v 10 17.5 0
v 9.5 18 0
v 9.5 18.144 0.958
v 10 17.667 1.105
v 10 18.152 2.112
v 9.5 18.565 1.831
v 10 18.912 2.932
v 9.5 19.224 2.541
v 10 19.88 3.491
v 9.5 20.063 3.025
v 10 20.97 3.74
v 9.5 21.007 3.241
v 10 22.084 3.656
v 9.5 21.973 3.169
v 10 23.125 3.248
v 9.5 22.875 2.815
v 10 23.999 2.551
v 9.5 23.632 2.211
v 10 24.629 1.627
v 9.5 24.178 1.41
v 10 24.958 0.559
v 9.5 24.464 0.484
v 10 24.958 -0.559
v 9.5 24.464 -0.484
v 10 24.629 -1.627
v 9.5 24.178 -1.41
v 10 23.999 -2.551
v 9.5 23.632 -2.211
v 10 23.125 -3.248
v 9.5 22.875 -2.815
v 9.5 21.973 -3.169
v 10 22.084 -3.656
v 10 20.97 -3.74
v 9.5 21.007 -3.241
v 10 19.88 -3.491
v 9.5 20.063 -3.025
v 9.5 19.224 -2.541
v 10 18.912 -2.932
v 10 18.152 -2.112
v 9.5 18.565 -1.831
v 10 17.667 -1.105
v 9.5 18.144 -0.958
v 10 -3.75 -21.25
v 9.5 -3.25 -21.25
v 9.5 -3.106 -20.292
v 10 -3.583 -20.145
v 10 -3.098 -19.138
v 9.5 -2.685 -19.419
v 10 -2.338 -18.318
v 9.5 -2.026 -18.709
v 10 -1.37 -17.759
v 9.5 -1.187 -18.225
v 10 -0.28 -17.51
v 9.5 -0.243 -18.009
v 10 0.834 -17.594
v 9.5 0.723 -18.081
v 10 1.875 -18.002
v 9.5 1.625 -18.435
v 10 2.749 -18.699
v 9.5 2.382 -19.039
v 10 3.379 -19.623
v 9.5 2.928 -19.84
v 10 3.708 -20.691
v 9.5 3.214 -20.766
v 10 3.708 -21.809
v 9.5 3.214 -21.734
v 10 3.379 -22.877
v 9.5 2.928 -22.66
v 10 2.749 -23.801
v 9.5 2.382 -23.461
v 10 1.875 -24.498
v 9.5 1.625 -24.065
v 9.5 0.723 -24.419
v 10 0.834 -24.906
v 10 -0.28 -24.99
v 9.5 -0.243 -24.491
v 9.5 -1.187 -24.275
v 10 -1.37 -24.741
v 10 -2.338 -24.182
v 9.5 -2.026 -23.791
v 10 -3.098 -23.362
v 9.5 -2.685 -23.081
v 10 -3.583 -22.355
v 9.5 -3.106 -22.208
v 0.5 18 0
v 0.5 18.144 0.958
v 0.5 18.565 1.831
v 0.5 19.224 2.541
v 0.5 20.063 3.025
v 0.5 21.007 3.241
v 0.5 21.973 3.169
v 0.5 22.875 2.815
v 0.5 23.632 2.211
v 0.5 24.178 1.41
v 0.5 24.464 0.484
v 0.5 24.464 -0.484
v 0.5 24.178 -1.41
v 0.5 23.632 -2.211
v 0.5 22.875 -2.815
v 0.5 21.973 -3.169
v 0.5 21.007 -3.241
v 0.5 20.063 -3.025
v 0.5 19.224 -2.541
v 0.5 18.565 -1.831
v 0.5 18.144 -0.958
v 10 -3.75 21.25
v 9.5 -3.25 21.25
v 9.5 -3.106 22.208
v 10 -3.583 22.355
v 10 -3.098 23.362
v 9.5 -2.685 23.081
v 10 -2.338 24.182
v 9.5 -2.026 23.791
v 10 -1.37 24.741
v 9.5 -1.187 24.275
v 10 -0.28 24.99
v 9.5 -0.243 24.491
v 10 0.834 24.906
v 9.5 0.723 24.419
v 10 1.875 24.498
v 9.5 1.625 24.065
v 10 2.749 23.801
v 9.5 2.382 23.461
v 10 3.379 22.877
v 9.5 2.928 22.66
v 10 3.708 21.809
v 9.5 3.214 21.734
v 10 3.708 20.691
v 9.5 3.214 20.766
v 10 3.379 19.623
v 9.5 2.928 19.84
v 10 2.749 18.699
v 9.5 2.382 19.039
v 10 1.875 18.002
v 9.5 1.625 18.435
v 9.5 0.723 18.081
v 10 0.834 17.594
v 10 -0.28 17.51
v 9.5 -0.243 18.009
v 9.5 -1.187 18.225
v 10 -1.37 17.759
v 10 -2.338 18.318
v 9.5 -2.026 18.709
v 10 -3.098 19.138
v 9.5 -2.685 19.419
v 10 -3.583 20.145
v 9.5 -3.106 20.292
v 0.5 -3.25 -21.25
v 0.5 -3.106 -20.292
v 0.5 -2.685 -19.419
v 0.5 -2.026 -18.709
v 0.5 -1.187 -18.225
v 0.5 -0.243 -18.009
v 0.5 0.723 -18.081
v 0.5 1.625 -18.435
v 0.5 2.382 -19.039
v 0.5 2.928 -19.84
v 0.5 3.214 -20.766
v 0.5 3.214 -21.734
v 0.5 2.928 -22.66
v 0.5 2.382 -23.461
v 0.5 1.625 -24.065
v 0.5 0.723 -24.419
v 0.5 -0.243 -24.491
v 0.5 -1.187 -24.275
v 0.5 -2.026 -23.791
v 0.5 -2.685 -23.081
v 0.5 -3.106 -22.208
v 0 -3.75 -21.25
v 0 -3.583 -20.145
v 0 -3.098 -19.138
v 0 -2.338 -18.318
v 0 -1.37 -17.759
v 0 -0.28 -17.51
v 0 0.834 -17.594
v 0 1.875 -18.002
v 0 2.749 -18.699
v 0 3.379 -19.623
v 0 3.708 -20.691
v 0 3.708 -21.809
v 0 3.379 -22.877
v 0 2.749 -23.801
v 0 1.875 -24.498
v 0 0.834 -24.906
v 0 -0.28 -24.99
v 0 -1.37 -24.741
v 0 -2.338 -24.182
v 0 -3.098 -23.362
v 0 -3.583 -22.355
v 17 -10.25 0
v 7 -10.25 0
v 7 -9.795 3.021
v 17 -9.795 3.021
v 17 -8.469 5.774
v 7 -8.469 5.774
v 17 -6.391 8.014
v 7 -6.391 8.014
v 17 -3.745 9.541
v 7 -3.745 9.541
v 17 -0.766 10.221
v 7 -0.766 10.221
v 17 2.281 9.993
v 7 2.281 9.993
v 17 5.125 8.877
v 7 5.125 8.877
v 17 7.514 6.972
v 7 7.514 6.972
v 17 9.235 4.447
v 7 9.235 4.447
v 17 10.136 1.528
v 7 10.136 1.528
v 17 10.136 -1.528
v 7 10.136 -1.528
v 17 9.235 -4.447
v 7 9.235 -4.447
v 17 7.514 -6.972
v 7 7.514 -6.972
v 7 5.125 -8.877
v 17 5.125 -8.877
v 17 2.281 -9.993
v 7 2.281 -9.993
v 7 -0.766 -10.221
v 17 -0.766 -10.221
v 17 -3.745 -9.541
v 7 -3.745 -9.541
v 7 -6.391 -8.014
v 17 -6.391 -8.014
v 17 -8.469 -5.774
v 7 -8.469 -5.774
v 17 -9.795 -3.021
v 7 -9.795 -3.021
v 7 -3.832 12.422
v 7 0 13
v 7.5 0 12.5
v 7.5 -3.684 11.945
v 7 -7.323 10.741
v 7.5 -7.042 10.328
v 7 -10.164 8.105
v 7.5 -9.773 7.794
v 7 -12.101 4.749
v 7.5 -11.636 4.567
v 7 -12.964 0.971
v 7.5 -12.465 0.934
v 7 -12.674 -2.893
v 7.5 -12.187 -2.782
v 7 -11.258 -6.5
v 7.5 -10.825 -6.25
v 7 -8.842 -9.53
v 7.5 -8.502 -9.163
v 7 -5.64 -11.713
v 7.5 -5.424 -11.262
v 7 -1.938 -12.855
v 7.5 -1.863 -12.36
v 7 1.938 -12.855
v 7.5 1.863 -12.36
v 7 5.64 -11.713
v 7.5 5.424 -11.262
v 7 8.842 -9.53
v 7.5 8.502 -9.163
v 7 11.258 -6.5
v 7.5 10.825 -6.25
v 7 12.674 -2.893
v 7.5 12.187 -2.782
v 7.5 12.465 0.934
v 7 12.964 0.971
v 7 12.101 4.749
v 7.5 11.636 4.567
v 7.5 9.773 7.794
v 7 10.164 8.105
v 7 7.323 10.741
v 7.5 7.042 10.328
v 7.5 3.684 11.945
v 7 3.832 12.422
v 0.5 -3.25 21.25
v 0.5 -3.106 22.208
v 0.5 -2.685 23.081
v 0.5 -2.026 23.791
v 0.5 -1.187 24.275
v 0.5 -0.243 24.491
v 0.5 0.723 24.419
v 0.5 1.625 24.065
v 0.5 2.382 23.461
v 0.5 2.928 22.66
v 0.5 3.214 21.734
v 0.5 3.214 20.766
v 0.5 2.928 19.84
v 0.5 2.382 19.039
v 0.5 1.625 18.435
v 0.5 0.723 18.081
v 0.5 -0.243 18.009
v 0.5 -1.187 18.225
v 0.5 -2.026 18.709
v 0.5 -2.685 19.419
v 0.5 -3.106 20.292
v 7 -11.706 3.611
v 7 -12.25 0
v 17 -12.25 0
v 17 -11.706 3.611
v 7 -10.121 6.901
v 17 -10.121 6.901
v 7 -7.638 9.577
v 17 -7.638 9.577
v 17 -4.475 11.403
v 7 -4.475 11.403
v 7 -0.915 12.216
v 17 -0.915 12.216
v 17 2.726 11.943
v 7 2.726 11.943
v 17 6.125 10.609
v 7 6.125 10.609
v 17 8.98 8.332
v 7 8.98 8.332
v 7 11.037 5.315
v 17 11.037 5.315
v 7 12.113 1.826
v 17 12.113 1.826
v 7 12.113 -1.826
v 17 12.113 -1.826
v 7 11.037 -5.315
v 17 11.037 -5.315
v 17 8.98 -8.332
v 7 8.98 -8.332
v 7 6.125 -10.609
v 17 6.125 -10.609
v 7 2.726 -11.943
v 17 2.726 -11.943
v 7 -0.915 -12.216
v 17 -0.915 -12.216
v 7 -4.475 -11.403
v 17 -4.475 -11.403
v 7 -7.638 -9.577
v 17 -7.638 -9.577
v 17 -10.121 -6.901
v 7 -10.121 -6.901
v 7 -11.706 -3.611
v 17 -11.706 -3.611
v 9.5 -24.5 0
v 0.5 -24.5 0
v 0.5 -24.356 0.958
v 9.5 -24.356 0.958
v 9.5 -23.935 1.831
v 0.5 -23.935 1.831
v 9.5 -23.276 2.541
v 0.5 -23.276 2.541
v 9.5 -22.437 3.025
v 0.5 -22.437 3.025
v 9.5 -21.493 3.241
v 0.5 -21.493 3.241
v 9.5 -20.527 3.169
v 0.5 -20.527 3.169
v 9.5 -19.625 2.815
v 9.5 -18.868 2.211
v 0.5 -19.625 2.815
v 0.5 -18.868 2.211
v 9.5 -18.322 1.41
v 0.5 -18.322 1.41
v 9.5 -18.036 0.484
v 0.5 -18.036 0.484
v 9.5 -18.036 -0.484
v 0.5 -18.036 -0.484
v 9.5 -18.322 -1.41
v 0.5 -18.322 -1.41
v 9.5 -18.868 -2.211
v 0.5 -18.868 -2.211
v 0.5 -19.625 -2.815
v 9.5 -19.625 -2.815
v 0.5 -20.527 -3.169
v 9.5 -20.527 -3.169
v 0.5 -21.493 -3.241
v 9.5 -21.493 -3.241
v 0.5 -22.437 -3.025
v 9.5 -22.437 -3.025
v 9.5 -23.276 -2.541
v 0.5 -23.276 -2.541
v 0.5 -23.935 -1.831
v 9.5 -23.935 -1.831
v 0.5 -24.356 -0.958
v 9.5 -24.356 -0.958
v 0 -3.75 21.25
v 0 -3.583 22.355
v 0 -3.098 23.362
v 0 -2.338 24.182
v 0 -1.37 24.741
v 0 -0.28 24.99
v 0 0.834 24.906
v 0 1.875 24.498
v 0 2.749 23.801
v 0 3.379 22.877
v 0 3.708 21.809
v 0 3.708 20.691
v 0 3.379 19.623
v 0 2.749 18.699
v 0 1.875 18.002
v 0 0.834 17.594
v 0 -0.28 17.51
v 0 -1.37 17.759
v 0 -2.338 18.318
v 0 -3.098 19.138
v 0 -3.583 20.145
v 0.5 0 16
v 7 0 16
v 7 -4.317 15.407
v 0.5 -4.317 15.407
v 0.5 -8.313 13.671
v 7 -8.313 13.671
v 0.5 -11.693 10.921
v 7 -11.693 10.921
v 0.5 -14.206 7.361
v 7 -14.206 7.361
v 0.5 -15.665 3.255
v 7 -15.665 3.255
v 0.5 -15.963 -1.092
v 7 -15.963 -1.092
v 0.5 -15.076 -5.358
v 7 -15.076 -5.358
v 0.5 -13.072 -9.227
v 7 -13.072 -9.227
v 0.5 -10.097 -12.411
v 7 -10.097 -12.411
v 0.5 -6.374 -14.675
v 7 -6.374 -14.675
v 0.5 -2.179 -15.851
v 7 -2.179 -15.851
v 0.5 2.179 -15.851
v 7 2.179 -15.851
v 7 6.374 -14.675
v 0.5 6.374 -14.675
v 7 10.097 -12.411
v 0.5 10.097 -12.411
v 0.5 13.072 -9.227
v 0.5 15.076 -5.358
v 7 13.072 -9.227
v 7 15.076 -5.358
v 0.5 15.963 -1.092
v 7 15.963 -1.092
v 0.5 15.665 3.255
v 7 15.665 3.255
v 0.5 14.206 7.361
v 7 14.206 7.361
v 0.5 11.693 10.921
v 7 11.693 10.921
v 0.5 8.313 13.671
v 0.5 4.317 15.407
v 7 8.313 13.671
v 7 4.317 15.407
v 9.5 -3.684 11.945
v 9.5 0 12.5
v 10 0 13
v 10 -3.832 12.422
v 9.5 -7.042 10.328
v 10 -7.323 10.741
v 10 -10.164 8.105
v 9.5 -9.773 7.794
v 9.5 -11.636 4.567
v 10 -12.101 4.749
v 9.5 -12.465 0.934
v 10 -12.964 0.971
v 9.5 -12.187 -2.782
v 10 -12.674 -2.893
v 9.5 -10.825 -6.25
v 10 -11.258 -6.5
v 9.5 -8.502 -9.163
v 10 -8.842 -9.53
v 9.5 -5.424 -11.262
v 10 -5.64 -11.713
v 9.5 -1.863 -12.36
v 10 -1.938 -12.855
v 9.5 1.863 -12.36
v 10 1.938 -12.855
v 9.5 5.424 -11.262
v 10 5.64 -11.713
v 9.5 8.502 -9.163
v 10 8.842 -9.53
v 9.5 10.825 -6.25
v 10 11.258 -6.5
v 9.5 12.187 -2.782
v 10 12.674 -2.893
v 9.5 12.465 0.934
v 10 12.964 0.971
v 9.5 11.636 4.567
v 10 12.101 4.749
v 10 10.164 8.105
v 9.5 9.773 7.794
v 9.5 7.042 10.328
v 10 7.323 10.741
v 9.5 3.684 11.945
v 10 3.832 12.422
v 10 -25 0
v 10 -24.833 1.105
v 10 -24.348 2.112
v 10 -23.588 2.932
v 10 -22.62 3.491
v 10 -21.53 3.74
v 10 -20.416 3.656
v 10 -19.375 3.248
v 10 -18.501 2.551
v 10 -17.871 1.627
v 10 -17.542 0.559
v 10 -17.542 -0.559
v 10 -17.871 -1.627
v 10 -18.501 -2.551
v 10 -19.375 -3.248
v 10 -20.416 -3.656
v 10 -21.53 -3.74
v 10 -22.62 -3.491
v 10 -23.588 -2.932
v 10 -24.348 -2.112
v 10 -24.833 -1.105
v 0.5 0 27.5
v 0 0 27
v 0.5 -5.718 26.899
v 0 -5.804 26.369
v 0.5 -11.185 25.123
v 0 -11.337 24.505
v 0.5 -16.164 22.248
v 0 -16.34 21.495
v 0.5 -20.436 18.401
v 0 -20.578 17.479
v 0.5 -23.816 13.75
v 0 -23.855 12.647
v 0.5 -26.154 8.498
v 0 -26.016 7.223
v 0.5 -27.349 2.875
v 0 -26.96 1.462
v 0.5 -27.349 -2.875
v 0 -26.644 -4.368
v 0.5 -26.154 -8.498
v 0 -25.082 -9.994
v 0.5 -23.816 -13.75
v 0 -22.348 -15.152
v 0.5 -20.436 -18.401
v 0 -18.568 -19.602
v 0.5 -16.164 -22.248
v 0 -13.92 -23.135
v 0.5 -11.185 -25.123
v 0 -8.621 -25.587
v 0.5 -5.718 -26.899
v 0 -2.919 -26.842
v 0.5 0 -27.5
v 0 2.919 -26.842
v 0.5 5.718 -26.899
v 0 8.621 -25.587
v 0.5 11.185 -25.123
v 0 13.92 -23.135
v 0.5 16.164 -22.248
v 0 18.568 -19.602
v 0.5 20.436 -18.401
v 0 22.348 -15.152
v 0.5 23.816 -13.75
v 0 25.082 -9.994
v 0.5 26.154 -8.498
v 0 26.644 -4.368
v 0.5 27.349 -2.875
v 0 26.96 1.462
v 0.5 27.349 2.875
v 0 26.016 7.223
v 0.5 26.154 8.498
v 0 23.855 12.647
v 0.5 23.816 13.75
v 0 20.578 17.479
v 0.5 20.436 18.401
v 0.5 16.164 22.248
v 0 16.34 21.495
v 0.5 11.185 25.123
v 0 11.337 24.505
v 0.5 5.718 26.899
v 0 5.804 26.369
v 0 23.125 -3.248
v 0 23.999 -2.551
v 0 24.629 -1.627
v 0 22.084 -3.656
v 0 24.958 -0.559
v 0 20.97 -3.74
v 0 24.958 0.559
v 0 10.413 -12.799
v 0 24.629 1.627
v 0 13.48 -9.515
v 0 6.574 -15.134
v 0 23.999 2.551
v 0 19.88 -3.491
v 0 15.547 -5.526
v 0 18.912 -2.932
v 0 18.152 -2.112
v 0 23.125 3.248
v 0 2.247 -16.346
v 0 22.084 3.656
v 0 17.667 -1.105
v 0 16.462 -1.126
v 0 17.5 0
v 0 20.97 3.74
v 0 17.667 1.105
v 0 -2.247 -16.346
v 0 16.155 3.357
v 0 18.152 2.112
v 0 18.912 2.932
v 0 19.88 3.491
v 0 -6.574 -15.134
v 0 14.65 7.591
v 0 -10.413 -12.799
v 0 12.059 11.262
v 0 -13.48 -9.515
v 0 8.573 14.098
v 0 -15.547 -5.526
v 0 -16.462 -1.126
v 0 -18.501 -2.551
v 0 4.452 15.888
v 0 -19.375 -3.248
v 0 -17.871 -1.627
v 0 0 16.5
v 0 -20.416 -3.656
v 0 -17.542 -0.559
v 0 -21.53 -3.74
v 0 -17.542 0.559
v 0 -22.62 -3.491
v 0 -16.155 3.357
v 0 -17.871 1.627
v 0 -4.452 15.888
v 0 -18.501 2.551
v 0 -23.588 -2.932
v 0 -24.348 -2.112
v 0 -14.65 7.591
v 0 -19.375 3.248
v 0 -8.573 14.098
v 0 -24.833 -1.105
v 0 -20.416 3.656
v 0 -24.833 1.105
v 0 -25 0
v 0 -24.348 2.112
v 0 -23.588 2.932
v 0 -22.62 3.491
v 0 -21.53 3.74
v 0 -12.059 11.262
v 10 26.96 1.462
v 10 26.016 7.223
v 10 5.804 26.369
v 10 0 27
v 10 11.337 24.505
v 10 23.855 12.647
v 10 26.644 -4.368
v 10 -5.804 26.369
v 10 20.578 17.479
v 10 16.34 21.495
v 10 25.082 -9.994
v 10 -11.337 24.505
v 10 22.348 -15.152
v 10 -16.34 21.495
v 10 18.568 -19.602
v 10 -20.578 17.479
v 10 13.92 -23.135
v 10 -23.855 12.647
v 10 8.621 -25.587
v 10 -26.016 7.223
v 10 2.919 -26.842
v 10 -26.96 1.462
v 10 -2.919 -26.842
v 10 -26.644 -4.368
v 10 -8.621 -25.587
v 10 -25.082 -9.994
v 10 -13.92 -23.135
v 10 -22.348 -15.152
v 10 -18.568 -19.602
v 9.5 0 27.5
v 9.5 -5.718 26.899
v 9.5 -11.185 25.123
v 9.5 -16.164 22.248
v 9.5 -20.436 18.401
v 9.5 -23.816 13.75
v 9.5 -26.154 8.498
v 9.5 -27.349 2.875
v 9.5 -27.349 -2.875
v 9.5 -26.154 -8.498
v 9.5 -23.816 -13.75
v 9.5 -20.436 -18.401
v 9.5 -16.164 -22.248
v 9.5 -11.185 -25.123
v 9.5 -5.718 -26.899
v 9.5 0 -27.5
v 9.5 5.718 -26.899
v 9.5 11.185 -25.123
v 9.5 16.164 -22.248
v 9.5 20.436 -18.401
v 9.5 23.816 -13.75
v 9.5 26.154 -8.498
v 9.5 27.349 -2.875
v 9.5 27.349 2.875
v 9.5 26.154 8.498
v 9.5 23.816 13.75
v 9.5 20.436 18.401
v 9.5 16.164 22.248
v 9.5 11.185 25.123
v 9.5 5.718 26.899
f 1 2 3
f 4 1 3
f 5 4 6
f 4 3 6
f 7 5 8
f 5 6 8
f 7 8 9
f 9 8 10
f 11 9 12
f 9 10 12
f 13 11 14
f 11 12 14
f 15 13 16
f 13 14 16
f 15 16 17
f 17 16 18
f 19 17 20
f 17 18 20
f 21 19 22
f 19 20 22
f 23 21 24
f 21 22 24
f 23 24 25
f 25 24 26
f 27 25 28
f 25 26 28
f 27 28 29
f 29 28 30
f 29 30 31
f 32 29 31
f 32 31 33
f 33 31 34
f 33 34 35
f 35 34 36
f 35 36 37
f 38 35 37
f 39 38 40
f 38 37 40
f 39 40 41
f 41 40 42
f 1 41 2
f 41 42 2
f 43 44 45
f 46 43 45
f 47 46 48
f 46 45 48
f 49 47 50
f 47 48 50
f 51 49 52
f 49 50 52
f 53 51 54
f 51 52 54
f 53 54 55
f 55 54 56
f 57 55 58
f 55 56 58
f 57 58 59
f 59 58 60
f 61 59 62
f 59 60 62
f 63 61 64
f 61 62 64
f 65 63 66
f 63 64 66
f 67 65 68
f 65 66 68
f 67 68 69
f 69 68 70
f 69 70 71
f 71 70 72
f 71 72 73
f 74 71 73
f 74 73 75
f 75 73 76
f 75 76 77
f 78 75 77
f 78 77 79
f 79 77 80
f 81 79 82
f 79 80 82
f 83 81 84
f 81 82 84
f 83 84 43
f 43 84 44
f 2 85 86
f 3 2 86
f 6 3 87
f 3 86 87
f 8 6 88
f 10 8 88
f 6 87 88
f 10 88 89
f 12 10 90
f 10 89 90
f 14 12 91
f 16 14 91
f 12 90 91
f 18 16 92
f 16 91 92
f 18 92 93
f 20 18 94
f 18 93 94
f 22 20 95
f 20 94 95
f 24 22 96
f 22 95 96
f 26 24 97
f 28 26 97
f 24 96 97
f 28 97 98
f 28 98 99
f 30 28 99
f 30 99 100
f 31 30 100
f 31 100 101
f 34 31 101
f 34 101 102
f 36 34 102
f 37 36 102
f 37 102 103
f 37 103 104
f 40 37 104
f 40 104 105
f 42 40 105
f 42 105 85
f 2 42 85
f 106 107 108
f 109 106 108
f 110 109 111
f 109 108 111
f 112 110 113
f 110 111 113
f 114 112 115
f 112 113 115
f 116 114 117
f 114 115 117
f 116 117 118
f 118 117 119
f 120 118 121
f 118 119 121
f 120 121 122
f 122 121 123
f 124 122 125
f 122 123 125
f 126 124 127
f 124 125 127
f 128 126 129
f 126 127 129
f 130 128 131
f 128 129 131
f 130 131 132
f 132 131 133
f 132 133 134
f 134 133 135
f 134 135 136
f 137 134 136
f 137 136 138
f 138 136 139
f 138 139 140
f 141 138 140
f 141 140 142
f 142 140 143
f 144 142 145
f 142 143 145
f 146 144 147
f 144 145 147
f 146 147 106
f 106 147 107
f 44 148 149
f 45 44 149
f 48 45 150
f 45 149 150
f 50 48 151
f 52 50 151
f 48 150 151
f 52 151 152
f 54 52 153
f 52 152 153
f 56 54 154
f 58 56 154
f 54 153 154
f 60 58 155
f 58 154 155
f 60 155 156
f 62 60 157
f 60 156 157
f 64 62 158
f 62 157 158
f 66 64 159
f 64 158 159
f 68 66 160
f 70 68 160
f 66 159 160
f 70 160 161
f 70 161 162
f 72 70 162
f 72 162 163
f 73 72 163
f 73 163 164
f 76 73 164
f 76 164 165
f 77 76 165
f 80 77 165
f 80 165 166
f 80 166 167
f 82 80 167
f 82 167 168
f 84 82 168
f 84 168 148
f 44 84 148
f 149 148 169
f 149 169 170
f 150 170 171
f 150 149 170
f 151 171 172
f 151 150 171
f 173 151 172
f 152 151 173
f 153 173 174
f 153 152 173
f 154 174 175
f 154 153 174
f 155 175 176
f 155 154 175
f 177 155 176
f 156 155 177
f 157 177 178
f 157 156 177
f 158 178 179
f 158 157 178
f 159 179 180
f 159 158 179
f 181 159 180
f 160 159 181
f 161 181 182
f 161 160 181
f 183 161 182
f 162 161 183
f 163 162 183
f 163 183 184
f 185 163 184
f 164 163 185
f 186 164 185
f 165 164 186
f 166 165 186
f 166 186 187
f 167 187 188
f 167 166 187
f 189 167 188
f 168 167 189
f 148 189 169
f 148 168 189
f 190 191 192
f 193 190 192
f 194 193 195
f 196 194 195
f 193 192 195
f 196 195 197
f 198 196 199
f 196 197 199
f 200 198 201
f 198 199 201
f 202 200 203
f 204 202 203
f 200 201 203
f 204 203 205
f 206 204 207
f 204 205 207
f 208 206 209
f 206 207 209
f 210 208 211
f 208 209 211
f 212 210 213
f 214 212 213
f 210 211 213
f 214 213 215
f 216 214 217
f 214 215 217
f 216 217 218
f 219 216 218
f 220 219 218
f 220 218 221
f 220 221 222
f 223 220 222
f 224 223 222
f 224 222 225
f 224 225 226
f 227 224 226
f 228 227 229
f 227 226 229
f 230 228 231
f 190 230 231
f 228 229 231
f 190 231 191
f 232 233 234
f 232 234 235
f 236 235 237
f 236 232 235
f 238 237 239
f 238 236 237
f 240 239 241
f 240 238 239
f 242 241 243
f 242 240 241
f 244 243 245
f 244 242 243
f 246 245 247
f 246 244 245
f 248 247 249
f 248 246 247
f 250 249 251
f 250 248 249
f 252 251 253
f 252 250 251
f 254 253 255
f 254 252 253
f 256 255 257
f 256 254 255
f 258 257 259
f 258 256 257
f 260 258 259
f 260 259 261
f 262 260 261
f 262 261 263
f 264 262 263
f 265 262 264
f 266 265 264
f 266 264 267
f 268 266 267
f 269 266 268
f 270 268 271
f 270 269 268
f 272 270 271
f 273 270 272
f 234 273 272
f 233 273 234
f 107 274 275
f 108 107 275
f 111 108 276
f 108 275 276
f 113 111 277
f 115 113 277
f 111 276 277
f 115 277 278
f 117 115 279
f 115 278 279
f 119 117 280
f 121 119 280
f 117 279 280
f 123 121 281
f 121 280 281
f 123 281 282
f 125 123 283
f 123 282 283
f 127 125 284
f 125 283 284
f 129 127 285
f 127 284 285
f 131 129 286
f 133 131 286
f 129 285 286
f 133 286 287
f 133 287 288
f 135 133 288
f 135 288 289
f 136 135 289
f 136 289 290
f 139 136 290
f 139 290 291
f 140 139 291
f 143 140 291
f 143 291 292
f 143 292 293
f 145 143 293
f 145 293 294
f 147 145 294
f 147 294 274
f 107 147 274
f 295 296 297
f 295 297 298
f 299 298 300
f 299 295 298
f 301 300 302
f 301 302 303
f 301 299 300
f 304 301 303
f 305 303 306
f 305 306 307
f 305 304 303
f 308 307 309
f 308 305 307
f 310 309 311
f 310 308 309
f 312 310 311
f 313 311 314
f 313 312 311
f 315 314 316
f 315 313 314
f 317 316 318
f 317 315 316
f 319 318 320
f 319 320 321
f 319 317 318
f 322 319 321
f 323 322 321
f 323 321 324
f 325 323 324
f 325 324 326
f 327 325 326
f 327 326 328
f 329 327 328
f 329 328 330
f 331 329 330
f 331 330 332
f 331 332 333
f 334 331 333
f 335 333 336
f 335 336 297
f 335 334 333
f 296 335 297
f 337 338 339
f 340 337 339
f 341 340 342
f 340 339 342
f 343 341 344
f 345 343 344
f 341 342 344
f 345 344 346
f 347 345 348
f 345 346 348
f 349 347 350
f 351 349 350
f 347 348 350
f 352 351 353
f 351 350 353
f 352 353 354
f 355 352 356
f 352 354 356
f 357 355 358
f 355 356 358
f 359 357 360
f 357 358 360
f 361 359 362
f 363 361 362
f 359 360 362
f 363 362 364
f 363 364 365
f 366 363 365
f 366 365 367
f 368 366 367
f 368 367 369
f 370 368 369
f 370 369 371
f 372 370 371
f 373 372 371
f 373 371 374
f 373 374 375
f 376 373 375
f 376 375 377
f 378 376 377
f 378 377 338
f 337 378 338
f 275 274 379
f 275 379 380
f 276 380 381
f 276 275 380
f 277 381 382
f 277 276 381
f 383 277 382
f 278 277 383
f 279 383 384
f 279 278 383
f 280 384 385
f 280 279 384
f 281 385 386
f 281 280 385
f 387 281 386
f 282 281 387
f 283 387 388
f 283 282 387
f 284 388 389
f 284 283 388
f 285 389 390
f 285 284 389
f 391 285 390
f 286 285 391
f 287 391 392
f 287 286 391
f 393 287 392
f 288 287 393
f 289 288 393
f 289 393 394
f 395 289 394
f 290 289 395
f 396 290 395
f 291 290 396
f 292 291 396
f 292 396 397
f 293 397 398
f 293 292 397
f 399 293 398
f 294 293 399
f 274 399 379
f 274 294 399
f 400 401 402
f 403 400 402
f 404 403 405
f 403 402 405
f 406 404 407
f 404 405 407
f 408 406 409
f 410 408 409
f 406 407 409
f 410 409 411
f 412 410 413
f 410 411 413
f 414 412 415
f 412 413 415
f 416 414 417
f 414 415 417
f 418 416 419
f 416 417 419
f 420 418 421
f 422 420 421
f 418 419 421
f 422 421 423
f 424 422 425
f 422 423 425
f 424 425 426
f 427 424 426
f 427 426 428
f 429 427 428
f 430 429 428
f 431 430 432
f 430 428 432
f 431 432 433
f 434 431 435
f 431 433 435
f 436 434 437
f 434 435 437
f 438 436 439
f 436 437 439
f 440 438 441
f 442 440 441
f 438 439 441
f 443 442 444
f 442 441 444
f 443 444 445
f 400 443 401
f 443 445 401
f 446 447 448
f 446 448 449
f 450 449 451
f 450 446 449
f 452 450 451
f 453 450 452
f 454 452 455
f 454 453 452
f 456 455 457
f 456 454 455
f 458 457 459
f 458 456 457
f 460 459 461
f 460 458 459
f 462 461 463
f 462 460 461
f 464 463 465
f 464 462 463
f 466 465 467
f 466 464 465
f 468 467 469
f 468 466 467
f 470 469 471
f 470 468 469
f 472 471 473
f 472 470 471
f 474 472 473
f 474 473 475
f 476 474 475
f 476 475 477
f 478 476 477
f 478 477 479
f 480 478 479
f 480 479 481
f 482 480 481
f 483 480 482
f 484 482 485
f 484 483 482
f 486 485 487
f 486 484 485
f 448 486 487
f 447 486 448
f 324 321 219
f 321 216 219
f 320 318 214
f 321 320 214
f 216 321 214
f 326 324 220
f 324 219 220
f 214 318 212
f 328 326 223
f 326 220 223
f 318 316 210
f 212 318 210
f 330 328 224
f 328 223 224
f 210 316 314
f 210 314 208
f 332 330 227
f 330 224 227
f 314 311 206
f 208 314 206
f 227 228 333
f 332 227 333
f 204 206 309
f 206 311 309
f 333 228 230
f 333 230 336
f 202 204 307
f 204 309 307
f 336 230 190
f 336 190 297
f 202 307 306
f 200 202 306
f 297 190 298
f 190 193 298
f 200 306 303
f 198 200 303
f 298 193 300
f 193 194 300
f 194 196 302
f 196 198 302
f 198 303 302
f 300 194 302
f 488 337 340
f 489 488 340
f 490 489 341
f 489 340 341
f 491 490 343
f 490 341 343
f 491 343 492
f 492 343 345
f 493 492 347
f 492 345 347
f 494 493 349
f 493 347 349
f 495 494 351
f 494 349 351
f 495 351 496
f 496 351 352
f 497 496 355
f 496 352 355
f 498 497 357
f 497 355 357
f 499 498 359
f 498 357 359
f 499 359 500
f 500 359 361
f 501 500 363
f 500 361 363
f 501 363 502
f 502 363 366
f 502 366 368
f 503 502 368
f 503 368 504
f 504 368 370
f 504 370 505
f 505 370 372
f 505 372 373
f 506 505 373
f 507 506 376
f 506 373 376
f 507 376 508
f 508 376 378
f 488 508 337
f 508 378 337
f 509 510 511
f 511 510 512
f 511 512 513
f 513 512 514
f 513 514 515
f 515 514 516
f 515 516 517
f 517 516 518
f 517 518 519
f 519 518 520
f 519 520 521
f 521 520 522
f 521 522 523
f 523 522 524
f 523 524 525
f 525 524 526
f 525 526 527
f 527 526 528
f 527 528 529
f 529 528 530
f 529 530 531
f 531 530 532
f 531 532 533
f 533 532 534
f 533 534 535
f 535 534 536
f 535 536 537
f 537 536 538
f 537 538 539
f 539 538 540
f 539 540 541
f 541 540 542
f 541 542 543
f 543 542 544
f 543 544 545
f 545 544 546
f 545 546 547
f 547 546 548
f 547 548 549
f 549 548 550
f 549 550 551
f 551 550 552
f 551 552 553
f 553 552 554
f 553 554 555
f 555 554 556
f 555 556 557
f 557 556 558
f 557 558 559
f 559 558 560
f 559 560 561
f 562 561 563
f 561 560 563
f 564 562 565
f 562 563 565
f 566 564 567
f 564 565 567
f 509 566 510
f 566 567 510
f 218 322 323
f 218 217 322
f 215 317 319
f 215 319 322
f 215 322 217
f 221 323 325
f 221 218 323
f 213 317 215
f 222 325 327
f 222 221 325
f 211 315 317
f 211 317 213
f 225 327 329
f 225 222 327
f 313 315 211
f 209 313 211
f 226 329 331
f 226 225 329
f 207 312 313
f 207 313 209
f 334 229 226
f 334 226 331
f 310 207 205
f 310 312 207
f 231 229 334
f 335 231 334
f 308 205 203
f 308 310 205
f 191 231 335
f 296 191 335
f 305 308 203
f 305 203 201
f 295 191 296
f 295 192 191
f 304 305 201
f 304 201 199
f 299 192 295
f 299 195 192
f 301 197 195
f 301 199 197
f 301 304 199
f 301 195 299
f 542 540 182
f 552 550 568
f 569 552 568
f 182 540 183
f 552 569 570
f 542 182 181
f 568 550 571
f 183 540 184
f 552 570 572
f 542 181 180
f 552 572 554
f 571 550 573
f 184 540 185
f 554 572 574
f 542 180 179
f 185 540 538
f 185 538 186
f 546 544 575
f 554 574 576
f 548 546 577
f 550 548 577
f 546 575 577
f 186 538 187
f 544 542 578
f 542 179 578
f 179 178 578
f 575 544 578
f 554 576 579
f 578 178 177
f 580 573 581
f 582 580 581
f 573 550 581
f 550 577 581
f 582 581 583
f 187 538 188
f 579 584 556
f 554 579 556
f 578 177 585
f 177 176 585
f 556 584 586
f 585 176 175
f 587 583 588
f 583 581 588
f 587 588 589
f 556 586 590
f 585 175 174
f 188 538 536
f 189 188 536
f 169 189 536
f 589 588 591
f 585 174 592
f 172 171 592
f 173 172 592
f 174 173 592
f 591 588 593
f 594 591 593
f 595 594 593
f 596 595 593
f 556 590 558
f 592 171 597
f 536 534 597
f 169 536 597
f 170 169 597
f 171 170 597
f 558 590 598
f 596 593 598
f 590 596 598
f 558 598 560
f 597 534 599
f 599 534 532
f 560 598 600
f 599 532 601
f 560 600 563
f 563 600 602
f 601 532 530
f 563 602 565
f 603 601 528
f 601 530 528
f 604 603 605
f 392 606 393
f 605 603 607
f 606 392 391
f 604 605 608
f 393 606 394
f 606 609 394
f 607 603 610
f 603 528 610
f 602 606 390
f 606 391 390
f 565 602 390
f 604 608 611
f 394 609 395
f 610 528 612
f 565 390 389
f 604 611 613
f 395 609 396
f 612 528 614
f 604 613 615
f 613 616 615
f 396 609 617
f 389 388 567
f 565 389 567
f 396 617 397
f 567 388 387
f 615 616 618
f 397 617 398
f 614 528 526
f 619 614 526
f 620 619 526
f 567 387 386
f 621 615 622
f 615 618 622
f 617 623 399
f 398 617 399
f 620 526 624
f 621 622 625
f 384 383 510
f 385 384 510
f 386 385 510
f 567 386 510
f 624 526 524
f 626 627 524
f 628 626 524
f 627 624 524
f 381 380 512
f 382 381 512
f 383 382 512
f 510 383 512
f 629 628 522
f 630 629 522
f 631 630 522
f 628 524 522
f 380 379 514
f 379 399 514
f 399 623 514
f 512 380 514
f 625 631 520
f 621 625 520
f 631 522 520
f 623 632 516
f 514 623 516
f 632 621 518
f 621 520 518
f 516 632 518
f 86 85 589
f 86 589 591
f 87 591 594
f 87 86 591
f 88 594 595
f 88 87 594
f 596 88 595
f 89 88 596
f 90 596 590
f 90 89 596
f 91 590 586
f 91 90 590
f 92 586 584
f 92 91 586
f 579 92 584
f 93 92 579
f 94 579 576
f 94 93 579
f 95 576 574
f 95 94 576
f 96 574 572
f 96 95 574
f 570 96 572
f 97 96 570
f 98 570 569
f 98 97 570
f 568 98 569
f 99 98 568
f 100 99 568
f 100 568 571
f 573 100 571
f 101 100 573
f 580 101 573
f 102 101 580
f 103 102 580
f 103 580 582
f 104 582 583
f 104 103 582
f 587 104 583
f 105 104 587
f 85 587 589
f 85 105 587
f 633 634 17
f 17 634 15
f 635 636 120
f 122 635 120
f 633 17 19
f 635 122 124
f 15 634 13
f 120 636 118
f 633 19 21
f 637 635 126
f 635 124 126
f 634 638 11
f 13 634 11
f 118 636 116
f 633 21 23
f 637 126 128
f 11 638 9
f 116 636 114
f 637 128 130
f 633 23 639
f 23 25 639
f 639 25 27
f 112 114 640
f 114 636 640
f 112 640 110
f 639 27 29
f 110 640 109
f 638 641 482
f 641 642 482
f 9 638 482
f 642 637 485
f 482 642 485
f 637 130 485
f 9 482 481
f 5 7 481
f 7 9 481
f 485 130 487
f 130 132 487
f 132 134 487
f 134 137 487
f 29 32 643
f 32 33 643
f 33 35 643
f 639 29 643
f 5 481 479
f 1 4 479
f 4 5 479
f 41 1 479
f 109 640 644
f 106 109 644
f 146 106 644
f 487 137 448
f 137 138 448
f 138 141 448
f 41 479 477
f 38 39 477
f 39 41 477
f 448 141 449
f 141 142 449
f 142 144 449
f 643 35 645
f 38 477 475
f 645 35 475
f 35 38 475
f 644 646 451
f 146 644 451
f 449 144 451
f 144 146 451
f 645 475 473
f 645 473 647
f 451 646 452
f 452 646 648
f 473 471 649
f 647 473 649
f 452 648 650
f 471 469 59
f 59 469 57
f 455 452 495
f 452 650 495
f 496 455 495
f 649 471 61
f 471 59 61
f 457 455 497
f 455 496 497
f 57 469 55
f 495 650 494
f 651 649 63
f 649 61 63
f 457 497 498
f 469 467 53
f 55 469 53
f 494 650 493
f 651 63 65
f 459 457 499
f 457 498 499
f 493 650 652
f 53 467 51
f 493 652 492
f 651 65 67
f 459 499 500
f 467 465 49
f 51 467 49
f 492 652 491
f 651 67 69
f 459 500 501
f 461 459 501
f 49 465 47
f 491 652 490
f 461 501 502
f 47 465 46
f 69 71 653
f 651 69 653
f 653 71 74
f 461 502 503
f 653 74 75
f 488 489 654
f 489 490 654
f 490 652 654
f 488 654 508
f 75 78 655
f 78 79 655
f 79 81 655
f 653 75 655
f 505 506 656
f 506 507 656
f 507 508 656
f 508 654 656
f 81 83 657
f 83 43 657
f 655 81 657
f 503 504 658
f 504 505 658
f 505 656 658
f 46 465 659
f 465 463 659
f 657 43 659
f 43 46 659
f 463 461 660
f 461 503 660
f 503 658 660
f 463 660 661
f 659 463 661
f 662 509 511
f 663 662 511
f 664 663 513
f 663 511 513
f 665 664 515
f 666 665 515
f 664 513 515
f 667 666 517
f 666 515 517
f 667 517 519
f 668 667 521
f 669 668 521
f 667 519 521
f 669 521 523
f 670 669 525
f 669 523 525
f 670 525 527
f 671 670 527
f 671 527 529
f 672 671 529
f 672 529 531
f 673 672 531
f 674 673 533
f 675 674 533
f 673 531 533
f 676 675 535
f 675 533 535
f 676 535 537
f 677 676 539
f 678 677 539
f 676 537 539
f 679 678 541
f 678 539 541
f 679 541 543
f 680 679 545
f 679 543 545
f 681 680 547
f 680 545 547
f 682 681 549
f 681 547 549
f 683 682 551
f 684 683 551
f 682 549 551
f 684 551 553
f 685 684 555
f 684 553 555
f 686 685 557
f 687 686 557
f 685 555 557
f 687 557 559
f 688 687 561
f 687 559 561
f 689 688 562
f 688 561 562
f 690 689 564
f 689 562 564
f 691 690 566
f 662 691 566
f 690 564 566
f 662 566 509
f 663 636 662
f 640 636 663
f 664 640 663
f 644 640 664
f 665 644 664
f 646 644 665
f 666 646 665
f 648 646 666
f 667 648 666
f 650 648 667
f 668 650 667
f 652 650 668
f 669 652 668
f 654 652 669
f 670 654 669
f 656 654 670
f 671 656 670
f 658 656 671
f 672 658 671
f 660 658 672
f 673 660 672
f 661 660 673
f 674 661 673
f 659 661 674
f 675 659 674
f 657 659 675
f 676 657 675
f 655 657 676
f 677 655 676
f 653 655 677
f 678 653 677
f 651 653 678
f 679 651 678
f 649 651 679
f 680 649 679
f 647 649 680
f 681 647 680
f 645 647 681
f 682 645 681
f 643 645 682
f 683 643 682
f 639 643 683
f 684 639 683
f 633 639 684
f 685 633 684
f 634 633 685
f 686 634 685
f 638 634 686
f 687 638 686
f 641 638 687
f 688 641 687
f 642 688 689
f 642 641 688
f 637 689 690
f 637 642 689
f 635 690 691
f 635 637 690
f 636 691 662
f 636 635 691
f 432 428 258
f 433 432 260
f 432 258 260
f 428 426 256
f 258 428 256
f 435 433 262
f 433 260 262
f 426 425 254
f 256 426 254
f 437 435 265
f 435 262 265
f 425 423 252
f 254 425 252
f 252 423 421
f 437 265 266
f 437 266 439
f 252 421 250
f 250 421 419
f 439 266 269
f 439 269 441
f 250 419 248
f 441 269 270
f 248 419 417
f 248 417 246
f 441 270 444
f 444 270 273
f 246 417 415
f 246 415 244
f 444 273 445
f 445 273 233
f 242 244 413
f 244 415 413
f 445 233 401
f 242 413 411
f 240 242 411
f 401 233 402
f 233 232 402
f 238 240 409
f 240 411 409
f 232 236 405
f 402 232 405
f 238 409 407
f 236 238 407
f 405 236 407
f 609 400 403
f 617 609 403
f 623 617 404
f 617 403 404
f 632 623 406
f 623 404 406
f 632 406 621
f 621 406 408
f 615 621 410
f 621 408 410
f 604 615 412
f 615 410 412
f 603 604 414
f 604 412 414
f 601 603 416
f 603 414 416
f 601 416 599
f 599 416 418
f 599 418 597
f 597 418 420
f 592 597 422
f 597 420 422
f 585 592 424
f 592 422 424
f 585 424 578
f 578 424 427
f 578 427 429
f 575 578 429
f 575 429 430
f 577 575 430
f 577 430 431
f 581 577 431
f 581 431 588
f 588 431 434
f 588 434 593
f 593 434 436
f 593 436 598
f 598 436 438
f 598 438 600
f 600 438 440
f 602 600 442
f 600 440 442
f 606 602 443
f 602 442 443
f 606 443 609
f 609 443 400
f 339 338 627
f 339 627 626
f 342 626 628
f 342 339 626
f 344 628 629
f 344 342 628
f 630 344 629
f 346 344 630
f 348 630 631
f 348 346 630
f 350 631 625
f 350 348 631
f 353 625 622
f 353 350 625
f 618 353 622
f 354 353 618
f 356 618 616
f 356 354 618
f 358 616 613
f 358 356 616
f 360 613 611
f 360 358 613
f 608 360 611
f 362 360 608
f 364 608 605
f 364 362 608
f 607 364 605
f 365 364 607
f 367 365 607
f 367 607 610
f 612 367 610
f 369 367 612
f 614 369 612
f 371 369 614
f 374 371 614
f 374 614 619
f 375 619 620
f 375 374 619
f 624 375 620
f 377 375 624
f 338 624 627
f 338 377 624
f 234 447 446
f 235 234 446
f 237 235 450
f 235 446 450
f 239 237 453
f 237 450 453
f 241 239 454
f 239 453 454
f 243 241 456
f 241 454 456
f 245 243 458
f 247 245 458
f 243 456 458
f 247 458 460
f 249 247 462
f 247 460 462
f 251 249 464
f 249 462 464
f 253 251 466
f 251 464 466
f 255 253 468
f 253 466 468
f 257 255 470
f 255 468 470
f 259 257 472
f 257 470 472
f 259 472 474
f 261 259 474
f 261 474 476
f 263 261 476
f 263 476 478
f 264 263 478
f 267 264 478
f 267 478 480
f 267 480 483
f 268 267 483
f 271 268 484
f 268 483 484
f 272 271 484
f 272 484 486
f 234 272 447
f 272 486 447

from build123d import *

# Parameters (mm, degrees)
F2_R     = 3.25
F3_DEPTH = 10.001
F4_SIZE  = 0.5
F5_R     = 12.25
F5_R_2   = 10.25
F6_DEPTH = 10


with BuildPart() as f1:
    # F0 (on Front) → F1 (revolve)
    with BuildSketch(Plane.XZ):
        Polygon((10, 27.5), (0, 27.5), (0, 16), (7, 16), (7, 12.5), (10, 12.5), align=None)
    revolve(axis=Axis((-0.282709, 0, 0), (1, 0, 0)))

    # F2 (on face) → F3 (cut, through all)
    with BuildSketch(Plane(origin=(0, 0, 0), x_dir=(0, -1, 0), z_dir=(-1, 0, 0))):
        with Locations((0, -21.25)):
            Circle(F2_R)
        with Locations((21.25, 0)):
            Circle(F2_R)
        with Locations((0, 21.25)):
            Circle(F2_R)
        with Locations((-21.25, 0)):
            Circle(F2_R)
    extrude(amount=-F3_DEPTH, mode=Mode.SUBTRACT)

    # F4
    f4_edges = [f1.edges().sort_by_distance(p)[0] for p in [
        (10, 0, -27.5),
        (10, 0, -12.5),
        (0, 0, -27.5),
        (0, 0, -16),
        (7, 0, -12.5),
        (0, -18, 0),
        (0, 3.25, -21.25),
        (0, 24.5, 0),
        (0, 3.25, 21.25),
        (10, 3.25, 21.25),
        (10, 24.5, 0),
        (10, 3.25, -21.25),
        (10, -18, 0),
    ]]
    chamfer(f4_edges, length=F4_SIZE)


with BuildPart() as f6:
    # F5 (on face) → F6 (new body)
    with BuildSketch(Plane(origin=(7, 0, 0), x_dir=(0, -1, 0), z_dir=(-1, 0, 0))):
        Circle(F5_R)
        Circle(F5_R_2, mode=Mode.SUBTRACT)
    extrude(amount=-F6_DEPTH)


solid = Compound([f1.part, f6.part])
